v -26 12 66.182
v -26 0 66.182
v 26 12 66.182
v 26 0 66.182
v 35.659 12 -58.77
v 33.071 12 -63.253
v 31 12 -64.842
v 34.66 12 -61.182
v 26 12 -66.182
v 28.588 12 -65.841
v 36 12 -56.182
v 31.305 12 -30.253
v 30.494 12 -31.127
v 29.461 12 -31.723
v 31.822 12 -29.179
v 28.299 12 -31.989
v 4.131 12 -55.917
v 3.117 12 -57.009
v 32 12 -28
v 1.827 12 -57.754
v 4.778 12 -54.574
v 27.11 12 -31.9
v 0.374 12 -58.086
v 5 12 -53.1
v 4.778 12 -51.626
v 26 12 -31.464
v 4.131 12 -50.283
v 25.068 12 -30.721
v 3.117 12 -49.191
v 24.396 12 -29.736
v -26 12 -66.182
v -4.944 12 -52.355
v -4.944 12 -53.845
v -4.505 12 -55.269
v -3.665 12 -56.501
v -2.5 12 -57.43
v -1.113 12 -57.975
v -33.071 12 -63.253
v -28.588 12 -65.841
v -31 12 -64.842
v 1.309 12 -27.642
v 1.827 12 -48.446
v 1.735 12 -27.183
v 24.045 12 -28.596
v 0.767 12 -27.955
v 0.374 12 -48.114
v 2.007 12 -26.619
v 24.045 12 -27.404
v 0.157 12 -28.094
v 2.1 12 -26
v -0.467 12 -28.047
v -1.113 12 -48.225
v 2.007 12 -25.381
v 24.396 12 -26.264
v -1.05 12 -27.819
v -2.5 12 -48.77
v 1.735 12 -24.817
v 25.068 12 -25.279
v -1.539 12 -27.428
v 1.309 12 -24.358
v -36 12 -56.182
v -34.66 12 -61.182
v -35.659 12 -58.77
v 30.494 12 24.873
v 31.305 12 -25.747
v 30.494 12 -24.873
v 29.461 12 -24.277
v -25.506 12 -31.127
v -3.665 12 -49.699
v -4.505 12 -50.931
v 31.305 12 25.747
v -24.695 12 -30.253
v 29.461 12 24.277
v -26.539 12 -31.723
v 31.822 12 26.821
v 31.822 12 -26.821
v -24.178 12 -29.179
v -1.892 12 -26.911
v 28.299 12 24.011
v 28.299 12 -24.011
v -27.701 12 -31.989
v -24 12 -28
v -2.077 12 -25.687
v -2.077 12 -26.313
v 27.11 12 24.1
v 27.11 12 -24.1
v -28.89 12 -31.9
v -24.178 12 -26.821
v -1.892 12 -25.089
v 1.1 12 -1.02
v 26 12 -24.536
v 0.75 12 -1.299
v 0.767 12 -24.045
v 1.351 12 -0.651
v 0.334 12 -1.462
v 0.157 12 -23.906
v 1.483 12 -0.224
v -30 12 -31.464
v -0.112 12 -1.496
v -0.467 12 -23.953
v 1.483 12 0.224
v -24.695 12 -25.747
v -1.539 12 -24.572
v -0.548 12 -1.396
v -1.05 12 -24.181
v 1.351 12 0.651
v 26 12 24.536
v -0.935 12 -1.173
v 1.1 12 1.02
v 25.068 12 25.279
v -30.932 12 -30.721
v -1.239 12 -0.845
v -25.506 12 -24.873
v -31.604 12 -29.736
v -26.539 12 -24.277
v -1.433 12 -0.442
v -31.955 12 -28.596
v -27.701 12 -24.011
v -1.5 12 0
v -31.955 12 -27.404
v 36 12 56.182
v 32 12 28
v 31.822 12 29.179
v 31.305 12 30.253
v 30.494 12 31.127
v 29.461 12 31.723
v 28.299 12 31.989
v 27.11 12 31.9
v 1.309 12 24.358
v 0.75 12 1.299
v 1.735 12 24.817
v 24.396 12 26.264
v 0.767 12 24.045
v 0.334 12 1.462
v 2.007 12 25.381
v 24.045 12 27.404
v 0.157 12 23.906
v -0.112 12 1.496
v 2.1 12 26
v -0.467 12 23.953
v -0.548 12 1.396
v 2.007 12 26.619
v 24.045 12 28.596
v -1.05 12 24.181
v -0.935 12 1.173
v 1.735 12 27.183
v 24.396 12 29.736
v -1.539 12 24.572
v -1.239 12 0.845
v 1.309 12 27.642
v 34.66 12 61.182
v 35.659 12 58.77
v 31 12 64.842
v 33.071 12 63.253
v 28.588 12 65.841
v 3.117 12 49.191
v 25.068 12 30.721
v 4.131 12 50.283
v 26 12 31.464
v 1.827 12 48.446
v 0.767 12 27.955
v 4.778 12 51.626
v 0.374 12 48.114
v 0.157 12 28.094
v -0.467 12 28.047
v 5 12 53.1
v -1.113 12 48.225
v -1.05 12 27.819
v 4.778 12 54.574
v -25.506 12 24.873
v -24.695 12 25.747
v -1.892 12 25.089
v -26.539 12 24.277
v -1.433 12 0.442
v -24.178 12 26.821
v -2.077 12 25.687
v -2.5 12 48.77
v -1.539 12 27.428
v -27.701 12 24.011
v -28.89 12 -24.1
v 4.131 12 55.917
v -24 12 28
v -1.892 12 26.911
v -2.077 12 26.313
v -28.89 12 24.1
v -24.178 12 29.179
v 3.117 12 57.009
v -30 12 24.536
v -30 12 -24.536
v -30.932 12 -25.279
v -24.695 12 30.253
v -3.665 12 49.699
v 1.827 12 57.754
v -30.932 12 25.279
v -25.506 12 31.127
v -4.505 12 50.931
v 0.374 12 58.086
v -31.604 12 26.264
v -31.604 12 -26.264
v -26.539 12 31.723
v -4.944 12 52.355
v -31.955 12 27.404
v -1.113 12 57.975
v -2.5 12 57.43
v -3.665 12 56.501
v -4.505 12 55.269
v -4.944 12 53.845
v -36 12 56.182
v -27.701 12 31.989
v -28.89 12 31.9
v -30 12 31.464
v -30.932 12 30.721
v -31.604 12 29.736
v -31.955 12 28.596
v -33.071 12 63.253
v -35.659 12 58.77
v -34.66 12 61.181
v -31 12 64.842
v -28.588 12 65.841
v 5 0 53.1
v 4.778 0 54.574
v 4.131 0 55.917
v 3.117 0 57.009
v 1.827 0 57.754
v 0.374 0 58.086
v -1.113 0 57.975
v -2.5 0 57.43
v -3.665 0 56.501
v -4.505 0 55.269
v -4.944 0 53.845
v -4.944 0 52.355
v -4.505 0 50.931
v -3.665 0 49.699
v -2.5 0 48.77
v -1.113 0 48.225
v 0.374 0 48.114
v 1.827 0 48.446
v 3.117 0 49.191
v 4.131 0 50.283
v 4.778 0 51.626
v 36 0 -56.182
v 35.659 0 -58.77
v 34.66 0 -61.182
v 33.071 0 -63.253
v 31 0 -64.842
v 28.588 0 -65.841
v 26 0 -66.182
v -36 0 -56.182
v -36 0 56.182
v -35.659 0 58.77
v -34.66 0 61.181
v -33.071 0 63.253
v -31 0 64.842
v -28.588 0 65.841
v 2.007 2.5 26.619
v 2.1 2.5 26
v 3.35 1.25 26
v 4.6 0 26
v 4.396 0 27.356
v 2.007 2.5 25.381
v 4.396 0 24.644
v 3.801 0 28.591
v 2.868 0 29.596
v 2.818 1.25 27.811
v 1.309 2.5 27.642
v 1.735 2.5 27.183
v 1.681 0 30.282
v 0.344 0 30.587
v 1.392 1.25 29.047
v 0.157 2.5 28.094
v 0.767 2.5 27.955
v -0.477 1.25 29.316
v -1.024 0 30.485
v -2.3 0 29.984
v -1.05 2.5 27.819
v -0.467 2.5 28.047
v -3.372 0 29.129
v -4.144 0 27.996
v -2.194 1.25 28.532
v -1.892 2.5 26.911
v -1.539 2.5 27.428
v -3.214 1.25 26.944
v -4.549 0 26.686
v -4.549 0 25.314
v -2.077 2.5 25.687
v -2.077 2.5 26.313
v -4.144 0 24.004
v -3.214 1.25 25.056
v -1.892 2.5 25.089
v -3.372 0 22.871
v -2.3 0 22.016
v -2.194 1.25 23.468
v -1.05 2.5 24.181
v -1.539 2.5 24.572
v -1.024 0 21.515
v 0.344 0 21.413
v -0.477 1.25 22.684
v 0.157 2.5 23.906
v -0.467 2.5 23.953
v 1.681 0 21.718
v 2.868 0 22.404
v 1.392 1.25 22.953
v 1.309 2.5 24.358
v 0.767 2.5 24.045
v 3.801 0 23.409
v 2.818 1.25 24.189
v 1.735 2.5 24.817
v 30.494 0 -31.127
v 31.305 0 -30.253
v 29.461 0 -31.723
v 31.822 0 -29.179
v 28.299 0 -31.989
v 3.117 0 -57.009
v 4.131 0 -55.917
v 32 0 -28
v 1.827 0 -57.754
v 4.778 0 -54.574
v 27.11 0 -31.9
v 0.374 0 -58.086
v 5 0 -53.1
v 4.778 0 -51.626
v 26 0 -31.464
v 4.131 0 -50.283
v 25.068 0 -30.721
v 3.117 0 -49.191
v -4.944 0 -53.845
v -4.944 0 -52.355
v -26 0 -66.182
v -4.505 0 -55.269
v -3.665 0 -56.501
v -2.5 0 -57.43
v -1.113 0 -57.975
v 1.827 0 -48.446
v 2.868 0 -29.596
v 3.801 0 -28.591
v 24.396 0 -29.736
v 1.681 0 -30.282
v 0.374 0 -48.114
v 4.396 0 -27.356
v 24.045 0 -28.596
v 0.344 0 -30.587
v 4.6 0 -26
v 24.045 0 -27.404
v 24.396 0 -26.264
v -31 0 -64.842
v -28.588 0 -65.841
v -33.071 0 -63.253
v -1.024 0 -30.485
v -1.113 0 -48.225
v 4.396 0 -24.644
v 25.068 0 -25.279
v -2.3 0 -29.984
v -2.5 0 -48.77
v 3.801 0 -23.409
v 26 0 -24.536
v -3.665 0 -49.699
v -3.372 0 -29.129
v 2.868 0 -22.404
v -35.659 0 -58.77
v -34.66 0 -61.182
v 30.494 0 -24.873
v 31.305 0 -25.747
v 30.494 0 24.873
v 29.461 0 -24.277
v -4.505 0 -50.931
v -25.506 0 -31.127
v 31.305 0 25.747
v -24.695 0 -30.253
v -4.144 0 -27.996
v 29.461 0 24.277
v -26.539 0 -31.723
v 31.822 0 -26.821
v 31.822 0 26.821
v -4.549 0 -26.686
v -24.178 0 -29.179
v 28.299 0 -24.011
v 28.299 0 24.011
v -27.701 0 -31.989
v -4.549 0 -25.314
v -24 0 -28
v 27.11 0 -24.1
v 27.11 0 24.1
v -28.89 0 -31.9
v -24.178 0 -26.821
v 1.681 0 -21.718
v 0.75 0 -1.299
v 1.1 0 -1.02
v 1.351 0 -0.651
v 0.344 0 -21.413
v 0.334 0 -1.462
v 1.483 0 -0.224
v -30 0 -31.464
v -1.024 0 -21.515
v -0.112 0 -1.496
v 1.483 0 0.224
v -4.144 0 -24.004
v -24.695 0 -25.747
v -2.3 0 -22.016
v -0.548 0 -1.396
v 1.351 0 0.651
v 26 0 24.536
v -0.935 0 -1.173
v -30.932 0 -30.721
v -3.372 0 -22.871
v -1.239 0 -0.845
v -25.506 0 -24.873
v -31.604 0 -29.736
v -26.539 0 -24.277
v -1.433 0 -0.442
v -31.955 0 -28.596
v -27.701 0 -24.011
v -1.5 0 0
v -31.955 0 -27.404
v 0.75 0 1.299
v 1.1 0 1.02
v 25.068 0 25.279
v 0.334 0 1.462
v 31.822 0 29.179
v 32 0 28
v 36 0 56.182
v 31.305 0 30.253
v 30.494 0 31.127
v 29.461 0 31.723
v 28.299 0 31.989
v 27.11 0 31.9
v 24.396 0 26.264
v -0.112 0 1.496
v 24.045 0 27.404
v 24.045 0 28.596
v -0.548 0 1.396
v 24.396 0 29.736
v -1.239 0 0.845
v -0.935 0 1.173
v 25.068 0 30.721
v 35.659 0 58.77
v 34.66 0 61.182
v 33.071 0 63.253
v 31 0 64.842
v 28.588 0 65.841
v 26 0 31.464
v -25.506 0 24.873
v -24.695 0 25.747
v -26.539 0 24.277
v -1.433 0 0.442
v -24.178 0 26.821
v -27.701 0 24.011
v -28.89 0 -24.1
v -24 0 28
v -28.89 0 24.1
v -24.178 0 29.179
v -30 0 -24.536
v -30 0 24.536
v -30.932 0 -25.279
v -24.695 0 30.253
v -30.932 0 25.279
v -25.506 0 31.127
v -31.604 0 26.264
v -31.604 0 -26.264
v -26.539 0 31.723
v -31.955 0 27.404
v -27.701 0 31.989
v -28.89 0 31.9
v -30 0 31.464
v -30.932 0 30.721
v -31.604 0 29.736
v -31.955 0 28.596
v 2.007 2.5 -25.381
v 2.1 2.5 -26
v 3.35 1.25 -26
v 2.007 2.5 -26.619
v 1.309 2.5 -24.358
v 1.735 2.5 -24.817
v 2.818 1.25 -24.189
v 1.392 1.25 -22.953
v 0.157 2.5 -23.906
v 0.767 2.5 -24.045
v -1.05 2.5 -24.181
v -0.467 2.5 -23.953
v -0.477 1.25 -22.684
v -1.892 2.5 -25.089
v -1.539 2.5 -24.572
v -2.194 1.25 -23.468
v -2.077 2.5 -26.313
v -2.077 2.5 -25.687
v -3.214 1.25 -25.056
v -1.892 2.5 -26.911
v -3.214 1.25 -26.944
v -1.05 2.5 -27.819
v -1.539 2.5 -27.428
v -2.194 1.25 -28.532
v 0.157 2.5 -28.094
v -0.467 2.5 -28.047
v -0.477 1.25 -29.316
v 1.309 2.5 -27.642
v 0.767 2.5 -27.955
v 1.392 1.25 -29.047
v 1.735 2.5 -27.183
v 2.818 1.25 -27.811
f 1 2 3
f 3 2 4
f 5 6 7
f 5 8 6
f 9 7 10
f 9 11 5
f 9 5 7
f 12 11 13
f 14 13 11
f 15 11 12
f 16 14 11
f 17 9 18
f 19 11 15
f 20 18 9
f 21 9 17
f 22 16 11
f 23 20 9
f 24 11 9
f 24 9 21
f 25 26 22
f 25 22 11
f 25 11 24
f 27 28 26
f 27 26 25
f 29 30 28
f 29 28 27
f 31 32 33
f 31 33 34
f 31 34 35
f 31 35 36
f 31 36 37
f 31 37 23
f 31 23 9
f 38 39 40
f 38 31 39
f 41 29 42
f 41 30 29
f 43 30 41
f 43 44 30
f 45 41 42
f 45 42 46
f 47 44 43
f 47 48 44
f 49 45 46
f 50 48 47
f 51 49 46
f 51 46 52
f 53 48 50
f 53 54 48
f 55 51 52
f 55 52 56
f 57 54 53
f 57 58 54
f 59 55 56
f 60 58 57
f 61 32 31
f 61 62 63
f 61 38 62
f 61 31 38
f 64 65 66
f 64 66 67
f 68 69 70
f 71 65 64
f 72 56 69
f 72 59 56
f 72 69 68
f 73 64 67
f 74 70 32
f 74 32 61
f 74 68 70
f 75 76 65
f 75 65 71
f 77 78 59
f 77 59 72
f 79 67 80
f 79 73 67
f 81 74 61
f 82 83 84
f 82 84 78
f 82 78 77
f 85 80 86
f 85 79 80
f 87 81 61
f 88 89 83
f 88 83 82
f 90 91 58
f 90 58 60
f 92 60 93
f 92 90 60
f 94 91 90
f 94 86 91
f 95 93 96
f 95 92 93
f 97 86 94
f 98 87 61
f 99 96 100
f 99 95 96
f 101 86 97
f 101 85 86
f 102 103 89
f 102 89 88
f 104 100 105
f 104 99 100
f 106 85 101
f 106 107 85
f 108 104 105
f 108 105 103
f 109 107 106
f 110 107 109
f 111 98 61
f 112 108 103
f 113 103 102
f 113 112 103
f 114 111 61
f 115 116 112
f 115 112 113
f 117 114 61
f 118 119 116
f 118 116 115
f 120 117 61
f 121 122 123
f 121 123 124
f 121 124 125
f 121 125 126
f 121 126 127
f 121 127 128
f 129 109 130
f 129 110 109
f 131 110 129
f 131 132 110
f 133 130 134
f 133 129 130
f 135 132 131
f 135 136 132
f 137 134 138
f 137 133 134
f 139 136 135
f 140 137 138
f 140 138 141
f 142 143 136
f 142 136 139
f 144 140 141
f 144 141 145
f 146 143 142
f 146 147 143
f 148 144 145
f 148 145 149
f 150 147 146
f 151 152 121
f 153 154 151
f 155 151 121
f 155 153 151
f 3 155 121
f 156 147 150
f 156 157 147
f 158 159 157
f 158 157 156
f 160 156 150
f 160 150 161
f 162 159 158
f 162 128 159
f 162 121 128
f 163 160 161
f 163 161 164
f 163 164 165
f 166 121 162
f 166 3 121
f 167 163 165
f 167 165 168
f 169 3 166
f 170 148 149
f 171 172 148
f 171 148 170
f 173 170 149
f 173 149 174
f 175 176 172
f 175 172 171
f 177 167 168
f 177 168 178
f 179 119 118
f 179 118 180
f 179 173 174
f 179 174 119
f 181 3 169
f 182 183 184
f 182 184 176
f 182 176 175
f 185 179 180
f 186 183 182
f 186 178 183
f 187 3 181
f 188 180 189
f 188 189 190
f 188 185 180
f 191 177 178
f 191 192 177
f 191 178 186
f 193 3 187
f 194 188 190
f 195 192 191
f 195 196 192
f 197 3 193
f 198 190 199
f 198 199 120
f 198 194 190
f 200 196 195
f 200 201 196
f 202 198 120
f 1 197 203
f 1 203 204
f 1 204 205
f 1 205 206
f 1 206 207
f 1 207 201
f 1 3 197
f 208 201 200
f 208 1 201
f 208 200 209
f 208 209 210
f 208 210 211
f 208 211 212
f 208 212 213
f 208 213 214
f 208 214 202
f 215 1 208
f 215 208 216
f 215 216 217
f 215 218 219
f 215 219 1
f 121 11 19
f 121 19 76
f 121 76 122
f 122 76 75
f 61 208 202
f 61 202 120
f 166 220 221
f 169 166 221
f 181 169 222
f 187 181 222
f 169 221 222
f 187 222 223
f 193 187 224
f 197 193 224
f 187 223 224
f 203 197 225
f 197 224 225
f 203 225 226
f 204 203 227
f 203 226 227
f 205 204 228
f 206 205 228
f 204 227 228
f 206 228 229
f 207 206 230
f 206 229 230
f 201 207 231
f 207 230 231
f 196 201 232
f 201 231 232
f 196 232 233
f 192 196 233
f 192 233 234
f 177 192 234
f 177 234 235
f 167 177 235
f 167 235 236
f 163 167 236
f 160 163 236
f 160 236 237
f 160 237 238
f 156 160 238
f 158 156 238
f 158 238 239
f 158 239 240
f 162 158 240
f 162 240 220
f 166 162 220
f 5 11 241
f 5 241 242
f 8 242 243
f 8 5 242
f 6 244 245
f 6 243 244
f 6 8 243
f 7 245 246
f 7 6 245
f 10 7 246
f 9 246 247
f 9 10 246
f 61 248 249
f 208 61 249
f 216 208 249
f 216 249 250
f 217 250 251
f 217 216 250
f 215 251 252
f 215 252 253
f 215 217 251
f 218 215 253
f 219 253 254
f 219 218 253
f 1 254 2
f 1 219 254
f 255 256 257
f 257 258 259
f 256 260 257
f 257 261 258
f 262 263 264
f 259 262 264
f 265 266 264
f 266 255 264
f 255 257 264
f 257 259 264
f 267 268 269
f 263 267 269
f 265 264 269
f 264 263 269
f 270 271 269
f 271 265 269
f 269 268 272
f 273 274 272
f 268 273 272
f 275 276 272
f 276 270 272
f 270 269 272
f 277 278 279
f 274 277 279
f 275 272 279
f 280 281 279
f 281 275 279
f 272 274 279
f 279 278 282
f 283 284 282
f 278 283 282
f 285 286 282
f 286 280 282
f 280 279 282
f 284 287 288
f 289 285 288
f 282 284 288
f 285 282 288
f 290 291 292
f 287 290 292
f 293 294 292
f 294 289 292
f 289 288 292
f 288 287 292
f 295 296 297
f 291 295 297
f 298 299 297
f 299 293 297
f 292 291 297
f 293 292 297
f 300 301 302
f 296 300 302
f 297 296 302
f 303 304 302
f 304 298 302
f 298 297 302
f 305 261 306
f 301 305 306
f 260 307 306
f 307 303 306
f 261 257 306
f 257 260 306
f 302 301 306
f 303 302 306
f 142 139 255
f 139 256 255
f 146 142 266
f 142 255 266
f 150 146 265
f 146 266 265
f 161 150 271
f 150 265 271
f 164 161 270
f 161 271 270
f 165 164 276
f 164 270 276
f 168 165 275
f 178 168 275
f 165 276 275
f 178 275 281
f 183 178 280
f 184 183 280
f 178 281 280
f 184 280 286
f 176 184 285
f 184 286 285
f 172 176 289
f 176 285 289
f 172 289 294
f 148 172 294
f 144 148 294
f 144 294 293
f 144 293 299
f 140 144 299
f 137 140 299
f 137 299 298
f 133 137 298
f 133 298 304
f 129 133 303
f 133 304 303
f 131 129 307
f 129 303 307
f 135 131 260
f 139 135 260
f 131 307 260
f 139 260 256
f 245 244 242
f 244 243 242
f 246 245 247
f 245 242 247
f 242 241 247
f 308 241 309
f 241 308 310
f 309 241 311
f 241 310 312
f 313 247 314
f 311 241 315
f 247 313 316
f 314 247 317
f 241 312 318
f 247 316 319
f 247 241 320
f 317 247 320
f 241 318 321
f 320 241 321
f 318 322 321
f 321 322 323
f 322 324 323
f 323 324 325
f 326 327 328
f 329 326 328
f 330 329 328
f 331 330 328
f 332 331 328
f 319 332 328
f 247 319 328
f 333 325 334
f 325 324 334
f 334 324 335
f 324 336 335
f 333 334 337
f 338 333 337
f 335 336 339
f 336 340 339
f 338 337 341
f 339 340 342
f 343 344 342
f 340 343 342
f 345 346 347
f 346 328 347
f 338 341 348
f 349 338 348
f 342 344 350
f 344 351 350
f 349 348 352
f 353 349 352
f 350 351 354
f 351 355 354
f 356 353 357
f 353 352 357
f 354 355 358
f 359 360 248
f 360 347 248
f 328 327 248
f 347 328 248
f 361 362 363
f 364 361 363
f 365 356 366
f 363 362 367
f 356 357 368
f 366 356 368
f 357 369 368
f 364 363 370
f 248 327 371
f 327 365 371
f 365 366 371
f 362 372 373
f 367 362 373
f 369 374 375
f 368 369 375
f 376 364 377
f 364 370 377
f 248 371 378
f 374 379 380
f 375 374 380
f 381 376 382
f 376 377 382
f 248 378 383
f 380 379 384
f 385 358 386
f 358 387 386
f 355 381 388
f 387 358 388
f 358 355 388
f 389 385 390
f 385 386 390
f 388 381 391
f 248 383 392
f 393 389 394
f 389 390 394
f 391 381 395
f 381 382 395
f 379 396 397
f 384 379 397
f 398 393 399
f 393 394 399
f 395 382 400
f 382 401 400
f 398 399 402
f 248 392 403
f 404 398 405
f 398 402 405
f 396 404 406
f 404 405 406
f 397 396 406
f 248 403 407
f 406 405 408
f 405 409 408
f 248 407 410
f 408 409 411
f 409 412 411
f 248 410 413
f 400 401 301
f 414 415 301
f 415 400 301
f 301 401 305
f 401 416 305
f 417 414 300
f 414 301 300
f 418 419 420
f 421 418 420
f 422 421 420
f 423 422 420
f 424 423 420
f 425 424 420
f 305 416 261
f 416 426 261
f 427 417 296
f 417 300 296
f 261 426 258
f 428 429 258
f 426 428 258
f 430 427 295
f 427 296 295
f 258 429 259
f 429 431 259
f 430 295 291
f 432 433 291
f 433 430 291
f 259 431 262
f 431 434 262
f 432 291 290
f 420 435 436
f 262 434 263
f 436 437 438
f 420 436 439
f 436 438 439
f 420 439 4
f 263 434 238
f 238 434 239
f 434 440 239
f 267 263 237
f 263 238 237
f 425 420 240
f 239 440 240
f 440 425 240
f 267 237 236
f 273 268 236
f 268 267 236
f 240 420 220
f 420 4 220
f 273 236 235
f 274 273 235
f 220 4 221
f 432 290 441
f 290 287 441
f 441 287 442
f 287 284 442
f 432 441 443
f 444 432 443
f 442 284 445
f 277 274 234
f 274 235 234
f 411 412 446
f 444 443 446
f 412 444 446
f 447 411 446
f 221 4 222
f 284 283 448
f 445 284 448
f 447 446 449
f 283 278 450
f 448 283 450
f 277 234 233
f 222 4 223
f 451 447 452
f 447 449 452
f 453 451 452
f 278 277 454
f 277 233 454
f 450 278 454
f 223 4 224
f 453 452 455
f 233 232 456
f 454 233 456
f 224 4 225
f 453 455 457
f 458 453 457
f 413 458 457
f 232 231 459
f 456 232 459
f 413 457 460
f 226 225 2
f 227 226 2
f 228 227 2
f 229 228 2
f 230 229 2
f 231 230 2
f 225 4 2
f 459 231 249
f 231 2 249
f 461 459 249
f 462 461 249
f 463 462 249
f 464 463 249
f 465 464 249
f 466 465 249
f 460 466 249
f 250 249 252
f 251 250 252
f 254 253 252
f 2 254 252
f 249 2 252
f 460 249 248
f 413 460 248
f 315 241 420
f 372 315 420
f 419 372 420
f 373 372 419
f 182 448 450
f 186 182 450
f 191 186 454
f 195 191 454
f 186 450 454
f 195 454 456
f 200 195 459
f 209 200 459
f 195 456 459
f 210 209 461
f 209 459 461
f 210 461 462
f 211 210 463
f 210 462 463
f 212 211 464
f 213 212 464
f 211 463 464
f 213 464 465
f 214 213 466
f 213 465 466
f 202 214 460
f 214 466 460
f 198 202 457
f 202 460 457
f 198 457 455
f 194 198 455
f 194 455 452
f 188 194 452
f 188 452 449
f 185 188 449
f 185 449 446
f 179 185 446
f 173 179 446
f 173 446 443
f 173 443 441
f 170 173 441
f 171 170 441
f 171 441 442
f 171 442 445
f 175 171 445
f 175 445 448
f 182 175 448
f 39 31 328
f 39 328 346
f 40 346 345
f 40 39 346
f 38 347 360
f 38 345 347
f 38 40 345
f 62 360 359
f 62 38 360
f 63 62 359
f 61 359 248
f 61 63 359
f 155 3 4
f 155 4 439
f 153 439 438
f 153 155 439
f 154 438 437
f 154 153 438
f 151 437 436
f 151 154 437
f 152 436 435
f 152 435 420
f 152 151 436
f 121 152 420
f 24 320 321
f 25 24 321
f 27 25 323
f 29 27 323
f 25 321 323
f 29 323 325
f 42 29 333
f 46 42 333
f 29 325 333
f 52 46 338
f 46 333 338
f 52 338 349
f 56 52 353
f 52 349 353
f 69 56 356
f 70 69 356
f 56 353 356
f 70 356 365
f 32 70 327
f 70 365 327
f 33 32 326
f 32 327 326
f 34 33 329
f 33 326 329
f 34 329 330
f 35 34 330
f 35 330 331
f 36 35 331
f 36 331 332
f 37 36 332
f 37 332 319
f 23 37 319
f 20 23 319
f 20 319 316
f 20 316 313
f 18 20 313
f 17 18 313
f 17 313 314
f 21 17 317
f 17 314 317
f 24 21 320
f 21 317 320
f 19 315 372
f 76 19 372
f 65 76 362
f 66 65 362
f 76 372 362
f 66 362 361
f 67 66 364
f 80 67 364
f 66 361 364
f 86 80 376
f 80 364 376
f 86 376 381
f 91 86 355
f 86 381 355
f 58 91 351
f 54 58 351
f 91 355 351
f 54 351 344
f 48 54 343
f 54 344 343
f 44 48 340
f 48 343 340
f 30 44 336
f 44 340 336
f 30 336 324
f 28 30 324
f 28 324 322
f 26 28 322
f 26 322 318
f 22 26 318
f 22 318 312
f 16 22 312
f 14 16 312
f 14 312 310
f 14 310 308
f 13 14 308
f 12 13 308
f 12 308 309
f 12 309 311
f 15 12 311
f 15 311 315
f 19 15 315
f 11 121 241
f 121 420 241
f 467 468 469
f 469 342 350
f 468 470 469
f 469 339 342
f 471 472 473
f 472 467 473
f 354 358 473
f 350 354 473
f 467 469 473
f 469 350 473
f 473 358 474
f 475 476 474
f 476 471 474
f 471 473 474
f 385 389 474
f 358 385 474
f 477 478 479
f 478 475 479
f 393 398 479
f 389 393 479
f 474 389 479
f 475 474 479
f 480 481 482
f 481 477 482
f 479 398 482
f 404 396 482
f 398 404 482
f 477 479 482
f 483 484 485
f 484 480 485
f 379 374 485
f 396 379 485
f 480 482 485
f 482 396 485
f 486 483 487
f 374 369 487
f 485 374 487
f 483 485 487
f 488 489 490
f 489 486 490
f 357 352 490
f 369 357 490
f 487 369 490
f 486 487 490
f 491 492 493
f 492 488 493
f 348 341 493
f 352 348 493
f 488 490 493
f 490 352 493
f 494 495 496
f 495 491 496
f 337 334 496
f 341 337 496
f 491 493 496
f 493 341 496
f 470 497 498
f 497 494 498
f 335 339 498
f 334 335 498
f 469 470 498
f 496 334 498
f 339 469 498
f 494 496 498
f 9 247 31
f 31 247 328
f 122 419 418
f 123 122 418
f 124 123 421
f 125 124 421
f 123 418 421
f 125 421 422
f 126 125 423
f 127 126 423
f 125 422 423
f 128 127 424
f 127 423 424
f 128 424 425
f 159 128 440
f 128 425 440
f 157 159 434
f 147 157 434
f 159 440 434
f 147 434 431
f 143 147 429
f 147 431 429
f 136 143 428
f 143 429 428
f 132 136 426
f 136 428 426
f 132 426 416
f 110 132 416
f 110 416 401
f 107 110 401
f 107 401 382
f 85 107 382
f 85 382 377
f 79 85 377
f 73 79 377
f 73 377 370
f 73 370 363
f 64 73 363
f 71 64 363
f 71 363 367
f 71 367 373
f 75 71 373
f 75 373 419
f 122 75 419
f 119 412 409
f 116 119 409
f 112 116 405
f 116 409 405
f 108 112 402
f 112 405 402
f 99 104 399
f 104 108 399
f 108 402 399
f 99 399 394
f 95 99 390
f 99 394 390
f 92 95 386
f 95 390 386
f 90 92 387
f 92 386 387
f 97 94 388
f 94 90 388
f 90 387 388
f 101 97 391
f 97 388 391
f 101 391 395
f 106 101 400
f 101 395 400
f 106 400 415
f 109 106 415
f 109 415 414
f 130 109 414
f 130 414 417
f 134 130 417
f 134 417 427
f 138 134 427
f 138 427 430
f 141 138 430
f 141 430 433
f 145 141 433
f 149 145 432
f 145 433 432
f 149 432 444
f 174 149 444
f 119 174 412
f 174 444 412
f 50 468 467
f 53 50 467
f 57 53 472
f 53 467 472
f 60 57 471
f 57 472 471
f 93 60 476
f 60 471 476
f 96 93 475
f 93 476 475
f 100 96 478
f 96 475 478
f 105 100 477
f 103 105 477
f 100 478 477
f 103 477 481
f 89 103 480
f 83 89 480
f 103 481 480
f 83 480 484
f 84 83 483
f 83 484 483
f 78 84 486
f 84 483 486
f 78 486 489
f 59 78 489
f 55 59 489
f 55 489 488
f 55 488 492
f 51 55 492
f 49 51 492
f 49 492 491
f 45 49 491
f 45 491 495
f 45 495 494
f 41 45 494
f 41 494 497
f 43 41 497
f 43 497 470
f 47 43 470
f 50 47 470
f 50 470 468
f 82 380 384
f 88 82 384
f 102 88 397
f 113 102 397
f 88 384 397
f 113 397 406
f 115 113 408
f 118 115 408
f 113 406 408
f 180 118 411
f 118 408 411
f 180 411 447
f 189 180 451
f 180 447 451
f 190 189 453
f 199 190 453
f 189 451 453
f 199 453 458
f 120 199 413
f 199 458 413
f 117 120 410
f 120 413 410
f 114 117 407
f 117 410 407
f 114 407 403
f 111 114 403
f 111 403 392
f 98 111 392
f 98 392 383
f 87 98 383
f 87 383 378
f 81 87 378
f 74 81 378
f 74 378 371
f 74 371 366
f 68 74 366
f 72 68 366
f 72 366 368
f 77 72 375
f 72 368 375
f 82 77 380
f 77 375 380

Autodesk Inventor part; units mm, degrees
ref_plane "YZ Plane" through (0, 0, 0) normal (1, 0, 0) x (0, 1, 0)
ref_plane "XZ Plane" through (0, 0, 0) normal (0, 1, 0) x (-1, 0, 0)
ref_plane "XY Plane" through (0, 0, 0) normal (0, 0, 1) x (1, 0, 0)
sketch "Esboço1" plane through (0, 0, 0) normal (0, 1, 0) x (-1, 0, 0)
  circle A0 centre (0, 0) radius 34.95
  circle A1 centre (0, 0) radius 1.5
  line L0 (36, 66.1815) -> (-36, 66.1815)
  line L1 (-36, 66.1815) -> (-36, -66.1815)
  line L2 (-36, -66.1815) -> (36, -66.1815)
  line L3 (36, -66.1815) -> (36, 66.1815)
  line L4 (36, 66.1815) -> (-36, -66.1815) construction
  line L5 (-36, 66.1815) -> (36, -66.1815) construction
  dimension "d0" = 69.9
  dimension "d3" = 3
  dimension "d11" = 132.363
  dimension "d12" = 72
extrude "Extrusão1" add sketch "Esboço1" along normal blind 12 contours A0 | L3 L2 L1 L0
sketch "Esboço2" plane through (0, 0, 0) normal (0, -1, 0) x (1, 0, 0)
  circle A0 centre (0, 0) radius 1.5 projected
  circle A1 centre (0, 0) radius 26
  circle A2 centre (0, -26) radius 2.1
  circle A3 centre (0, 26) radius 2.1
  circle A4 centre (0, 53.1) radius 5
  circle A5 centre (0, -53.1) radius 5
  dimension "d4" = 4.2
  dimension "d5" = 4.2
  dimension "d13" = 10
  dimension "d14" = 53.1
  dimension "d15" = 10
  dimension "d16" = 53.1
  dimension "d20" = 52
extrude "Extrusão2" cut sketch "Esboço2" against normal blind 12 contours A3 A1 | A1 A3 | A2 A1 | A1 A2 | A4 | A5
chamfer "Chanfro1" distance 2.5 angle 45 2 edges at (-2.1, 0, 26) (-2.1, 0, -26)
fillet "Arredondamento1" radius 10 4 edges at (-36, 6, -66.1815) (36, 6, -66.1815) (36, 6, 66.1815) (-36, 6, 66.1815)
sketch "Esboço3" plane through (0, 0, 0) normal (0, -1, 0) x (1, 0, 0)
  circle A0 centre (28, -28) radius 4
  circle A1 centre (0, 0) radius 1.5 projected
  line L0 (0, 0) -> (13.6078, 0)
  line L1 (13.6078, 0) -> (13.6078, -9.8158)
  line L2 (13.6078, -9.8158) -> (0, -9.8158)
  line L3 (0, -9.8158) -> (0, 0)
  circle A2 centre (28, 28) radius 4
  circle A3 centre (-28, -28) radius 4
  circle A4 centre (-28, 28) radius 4
  dimension "d22" = 8
  dimension "d23" = 28
  dimension "d24" = 28
  dimension "d27" = 56
  dimension "d30" = 56
extrude "Extrusão3" cut sketch "Esboço3" against normal blind 12 contours A0 | A2 | A3 | A4
equation "\"d16\" = d14"
properties part number "Inferior_base"
